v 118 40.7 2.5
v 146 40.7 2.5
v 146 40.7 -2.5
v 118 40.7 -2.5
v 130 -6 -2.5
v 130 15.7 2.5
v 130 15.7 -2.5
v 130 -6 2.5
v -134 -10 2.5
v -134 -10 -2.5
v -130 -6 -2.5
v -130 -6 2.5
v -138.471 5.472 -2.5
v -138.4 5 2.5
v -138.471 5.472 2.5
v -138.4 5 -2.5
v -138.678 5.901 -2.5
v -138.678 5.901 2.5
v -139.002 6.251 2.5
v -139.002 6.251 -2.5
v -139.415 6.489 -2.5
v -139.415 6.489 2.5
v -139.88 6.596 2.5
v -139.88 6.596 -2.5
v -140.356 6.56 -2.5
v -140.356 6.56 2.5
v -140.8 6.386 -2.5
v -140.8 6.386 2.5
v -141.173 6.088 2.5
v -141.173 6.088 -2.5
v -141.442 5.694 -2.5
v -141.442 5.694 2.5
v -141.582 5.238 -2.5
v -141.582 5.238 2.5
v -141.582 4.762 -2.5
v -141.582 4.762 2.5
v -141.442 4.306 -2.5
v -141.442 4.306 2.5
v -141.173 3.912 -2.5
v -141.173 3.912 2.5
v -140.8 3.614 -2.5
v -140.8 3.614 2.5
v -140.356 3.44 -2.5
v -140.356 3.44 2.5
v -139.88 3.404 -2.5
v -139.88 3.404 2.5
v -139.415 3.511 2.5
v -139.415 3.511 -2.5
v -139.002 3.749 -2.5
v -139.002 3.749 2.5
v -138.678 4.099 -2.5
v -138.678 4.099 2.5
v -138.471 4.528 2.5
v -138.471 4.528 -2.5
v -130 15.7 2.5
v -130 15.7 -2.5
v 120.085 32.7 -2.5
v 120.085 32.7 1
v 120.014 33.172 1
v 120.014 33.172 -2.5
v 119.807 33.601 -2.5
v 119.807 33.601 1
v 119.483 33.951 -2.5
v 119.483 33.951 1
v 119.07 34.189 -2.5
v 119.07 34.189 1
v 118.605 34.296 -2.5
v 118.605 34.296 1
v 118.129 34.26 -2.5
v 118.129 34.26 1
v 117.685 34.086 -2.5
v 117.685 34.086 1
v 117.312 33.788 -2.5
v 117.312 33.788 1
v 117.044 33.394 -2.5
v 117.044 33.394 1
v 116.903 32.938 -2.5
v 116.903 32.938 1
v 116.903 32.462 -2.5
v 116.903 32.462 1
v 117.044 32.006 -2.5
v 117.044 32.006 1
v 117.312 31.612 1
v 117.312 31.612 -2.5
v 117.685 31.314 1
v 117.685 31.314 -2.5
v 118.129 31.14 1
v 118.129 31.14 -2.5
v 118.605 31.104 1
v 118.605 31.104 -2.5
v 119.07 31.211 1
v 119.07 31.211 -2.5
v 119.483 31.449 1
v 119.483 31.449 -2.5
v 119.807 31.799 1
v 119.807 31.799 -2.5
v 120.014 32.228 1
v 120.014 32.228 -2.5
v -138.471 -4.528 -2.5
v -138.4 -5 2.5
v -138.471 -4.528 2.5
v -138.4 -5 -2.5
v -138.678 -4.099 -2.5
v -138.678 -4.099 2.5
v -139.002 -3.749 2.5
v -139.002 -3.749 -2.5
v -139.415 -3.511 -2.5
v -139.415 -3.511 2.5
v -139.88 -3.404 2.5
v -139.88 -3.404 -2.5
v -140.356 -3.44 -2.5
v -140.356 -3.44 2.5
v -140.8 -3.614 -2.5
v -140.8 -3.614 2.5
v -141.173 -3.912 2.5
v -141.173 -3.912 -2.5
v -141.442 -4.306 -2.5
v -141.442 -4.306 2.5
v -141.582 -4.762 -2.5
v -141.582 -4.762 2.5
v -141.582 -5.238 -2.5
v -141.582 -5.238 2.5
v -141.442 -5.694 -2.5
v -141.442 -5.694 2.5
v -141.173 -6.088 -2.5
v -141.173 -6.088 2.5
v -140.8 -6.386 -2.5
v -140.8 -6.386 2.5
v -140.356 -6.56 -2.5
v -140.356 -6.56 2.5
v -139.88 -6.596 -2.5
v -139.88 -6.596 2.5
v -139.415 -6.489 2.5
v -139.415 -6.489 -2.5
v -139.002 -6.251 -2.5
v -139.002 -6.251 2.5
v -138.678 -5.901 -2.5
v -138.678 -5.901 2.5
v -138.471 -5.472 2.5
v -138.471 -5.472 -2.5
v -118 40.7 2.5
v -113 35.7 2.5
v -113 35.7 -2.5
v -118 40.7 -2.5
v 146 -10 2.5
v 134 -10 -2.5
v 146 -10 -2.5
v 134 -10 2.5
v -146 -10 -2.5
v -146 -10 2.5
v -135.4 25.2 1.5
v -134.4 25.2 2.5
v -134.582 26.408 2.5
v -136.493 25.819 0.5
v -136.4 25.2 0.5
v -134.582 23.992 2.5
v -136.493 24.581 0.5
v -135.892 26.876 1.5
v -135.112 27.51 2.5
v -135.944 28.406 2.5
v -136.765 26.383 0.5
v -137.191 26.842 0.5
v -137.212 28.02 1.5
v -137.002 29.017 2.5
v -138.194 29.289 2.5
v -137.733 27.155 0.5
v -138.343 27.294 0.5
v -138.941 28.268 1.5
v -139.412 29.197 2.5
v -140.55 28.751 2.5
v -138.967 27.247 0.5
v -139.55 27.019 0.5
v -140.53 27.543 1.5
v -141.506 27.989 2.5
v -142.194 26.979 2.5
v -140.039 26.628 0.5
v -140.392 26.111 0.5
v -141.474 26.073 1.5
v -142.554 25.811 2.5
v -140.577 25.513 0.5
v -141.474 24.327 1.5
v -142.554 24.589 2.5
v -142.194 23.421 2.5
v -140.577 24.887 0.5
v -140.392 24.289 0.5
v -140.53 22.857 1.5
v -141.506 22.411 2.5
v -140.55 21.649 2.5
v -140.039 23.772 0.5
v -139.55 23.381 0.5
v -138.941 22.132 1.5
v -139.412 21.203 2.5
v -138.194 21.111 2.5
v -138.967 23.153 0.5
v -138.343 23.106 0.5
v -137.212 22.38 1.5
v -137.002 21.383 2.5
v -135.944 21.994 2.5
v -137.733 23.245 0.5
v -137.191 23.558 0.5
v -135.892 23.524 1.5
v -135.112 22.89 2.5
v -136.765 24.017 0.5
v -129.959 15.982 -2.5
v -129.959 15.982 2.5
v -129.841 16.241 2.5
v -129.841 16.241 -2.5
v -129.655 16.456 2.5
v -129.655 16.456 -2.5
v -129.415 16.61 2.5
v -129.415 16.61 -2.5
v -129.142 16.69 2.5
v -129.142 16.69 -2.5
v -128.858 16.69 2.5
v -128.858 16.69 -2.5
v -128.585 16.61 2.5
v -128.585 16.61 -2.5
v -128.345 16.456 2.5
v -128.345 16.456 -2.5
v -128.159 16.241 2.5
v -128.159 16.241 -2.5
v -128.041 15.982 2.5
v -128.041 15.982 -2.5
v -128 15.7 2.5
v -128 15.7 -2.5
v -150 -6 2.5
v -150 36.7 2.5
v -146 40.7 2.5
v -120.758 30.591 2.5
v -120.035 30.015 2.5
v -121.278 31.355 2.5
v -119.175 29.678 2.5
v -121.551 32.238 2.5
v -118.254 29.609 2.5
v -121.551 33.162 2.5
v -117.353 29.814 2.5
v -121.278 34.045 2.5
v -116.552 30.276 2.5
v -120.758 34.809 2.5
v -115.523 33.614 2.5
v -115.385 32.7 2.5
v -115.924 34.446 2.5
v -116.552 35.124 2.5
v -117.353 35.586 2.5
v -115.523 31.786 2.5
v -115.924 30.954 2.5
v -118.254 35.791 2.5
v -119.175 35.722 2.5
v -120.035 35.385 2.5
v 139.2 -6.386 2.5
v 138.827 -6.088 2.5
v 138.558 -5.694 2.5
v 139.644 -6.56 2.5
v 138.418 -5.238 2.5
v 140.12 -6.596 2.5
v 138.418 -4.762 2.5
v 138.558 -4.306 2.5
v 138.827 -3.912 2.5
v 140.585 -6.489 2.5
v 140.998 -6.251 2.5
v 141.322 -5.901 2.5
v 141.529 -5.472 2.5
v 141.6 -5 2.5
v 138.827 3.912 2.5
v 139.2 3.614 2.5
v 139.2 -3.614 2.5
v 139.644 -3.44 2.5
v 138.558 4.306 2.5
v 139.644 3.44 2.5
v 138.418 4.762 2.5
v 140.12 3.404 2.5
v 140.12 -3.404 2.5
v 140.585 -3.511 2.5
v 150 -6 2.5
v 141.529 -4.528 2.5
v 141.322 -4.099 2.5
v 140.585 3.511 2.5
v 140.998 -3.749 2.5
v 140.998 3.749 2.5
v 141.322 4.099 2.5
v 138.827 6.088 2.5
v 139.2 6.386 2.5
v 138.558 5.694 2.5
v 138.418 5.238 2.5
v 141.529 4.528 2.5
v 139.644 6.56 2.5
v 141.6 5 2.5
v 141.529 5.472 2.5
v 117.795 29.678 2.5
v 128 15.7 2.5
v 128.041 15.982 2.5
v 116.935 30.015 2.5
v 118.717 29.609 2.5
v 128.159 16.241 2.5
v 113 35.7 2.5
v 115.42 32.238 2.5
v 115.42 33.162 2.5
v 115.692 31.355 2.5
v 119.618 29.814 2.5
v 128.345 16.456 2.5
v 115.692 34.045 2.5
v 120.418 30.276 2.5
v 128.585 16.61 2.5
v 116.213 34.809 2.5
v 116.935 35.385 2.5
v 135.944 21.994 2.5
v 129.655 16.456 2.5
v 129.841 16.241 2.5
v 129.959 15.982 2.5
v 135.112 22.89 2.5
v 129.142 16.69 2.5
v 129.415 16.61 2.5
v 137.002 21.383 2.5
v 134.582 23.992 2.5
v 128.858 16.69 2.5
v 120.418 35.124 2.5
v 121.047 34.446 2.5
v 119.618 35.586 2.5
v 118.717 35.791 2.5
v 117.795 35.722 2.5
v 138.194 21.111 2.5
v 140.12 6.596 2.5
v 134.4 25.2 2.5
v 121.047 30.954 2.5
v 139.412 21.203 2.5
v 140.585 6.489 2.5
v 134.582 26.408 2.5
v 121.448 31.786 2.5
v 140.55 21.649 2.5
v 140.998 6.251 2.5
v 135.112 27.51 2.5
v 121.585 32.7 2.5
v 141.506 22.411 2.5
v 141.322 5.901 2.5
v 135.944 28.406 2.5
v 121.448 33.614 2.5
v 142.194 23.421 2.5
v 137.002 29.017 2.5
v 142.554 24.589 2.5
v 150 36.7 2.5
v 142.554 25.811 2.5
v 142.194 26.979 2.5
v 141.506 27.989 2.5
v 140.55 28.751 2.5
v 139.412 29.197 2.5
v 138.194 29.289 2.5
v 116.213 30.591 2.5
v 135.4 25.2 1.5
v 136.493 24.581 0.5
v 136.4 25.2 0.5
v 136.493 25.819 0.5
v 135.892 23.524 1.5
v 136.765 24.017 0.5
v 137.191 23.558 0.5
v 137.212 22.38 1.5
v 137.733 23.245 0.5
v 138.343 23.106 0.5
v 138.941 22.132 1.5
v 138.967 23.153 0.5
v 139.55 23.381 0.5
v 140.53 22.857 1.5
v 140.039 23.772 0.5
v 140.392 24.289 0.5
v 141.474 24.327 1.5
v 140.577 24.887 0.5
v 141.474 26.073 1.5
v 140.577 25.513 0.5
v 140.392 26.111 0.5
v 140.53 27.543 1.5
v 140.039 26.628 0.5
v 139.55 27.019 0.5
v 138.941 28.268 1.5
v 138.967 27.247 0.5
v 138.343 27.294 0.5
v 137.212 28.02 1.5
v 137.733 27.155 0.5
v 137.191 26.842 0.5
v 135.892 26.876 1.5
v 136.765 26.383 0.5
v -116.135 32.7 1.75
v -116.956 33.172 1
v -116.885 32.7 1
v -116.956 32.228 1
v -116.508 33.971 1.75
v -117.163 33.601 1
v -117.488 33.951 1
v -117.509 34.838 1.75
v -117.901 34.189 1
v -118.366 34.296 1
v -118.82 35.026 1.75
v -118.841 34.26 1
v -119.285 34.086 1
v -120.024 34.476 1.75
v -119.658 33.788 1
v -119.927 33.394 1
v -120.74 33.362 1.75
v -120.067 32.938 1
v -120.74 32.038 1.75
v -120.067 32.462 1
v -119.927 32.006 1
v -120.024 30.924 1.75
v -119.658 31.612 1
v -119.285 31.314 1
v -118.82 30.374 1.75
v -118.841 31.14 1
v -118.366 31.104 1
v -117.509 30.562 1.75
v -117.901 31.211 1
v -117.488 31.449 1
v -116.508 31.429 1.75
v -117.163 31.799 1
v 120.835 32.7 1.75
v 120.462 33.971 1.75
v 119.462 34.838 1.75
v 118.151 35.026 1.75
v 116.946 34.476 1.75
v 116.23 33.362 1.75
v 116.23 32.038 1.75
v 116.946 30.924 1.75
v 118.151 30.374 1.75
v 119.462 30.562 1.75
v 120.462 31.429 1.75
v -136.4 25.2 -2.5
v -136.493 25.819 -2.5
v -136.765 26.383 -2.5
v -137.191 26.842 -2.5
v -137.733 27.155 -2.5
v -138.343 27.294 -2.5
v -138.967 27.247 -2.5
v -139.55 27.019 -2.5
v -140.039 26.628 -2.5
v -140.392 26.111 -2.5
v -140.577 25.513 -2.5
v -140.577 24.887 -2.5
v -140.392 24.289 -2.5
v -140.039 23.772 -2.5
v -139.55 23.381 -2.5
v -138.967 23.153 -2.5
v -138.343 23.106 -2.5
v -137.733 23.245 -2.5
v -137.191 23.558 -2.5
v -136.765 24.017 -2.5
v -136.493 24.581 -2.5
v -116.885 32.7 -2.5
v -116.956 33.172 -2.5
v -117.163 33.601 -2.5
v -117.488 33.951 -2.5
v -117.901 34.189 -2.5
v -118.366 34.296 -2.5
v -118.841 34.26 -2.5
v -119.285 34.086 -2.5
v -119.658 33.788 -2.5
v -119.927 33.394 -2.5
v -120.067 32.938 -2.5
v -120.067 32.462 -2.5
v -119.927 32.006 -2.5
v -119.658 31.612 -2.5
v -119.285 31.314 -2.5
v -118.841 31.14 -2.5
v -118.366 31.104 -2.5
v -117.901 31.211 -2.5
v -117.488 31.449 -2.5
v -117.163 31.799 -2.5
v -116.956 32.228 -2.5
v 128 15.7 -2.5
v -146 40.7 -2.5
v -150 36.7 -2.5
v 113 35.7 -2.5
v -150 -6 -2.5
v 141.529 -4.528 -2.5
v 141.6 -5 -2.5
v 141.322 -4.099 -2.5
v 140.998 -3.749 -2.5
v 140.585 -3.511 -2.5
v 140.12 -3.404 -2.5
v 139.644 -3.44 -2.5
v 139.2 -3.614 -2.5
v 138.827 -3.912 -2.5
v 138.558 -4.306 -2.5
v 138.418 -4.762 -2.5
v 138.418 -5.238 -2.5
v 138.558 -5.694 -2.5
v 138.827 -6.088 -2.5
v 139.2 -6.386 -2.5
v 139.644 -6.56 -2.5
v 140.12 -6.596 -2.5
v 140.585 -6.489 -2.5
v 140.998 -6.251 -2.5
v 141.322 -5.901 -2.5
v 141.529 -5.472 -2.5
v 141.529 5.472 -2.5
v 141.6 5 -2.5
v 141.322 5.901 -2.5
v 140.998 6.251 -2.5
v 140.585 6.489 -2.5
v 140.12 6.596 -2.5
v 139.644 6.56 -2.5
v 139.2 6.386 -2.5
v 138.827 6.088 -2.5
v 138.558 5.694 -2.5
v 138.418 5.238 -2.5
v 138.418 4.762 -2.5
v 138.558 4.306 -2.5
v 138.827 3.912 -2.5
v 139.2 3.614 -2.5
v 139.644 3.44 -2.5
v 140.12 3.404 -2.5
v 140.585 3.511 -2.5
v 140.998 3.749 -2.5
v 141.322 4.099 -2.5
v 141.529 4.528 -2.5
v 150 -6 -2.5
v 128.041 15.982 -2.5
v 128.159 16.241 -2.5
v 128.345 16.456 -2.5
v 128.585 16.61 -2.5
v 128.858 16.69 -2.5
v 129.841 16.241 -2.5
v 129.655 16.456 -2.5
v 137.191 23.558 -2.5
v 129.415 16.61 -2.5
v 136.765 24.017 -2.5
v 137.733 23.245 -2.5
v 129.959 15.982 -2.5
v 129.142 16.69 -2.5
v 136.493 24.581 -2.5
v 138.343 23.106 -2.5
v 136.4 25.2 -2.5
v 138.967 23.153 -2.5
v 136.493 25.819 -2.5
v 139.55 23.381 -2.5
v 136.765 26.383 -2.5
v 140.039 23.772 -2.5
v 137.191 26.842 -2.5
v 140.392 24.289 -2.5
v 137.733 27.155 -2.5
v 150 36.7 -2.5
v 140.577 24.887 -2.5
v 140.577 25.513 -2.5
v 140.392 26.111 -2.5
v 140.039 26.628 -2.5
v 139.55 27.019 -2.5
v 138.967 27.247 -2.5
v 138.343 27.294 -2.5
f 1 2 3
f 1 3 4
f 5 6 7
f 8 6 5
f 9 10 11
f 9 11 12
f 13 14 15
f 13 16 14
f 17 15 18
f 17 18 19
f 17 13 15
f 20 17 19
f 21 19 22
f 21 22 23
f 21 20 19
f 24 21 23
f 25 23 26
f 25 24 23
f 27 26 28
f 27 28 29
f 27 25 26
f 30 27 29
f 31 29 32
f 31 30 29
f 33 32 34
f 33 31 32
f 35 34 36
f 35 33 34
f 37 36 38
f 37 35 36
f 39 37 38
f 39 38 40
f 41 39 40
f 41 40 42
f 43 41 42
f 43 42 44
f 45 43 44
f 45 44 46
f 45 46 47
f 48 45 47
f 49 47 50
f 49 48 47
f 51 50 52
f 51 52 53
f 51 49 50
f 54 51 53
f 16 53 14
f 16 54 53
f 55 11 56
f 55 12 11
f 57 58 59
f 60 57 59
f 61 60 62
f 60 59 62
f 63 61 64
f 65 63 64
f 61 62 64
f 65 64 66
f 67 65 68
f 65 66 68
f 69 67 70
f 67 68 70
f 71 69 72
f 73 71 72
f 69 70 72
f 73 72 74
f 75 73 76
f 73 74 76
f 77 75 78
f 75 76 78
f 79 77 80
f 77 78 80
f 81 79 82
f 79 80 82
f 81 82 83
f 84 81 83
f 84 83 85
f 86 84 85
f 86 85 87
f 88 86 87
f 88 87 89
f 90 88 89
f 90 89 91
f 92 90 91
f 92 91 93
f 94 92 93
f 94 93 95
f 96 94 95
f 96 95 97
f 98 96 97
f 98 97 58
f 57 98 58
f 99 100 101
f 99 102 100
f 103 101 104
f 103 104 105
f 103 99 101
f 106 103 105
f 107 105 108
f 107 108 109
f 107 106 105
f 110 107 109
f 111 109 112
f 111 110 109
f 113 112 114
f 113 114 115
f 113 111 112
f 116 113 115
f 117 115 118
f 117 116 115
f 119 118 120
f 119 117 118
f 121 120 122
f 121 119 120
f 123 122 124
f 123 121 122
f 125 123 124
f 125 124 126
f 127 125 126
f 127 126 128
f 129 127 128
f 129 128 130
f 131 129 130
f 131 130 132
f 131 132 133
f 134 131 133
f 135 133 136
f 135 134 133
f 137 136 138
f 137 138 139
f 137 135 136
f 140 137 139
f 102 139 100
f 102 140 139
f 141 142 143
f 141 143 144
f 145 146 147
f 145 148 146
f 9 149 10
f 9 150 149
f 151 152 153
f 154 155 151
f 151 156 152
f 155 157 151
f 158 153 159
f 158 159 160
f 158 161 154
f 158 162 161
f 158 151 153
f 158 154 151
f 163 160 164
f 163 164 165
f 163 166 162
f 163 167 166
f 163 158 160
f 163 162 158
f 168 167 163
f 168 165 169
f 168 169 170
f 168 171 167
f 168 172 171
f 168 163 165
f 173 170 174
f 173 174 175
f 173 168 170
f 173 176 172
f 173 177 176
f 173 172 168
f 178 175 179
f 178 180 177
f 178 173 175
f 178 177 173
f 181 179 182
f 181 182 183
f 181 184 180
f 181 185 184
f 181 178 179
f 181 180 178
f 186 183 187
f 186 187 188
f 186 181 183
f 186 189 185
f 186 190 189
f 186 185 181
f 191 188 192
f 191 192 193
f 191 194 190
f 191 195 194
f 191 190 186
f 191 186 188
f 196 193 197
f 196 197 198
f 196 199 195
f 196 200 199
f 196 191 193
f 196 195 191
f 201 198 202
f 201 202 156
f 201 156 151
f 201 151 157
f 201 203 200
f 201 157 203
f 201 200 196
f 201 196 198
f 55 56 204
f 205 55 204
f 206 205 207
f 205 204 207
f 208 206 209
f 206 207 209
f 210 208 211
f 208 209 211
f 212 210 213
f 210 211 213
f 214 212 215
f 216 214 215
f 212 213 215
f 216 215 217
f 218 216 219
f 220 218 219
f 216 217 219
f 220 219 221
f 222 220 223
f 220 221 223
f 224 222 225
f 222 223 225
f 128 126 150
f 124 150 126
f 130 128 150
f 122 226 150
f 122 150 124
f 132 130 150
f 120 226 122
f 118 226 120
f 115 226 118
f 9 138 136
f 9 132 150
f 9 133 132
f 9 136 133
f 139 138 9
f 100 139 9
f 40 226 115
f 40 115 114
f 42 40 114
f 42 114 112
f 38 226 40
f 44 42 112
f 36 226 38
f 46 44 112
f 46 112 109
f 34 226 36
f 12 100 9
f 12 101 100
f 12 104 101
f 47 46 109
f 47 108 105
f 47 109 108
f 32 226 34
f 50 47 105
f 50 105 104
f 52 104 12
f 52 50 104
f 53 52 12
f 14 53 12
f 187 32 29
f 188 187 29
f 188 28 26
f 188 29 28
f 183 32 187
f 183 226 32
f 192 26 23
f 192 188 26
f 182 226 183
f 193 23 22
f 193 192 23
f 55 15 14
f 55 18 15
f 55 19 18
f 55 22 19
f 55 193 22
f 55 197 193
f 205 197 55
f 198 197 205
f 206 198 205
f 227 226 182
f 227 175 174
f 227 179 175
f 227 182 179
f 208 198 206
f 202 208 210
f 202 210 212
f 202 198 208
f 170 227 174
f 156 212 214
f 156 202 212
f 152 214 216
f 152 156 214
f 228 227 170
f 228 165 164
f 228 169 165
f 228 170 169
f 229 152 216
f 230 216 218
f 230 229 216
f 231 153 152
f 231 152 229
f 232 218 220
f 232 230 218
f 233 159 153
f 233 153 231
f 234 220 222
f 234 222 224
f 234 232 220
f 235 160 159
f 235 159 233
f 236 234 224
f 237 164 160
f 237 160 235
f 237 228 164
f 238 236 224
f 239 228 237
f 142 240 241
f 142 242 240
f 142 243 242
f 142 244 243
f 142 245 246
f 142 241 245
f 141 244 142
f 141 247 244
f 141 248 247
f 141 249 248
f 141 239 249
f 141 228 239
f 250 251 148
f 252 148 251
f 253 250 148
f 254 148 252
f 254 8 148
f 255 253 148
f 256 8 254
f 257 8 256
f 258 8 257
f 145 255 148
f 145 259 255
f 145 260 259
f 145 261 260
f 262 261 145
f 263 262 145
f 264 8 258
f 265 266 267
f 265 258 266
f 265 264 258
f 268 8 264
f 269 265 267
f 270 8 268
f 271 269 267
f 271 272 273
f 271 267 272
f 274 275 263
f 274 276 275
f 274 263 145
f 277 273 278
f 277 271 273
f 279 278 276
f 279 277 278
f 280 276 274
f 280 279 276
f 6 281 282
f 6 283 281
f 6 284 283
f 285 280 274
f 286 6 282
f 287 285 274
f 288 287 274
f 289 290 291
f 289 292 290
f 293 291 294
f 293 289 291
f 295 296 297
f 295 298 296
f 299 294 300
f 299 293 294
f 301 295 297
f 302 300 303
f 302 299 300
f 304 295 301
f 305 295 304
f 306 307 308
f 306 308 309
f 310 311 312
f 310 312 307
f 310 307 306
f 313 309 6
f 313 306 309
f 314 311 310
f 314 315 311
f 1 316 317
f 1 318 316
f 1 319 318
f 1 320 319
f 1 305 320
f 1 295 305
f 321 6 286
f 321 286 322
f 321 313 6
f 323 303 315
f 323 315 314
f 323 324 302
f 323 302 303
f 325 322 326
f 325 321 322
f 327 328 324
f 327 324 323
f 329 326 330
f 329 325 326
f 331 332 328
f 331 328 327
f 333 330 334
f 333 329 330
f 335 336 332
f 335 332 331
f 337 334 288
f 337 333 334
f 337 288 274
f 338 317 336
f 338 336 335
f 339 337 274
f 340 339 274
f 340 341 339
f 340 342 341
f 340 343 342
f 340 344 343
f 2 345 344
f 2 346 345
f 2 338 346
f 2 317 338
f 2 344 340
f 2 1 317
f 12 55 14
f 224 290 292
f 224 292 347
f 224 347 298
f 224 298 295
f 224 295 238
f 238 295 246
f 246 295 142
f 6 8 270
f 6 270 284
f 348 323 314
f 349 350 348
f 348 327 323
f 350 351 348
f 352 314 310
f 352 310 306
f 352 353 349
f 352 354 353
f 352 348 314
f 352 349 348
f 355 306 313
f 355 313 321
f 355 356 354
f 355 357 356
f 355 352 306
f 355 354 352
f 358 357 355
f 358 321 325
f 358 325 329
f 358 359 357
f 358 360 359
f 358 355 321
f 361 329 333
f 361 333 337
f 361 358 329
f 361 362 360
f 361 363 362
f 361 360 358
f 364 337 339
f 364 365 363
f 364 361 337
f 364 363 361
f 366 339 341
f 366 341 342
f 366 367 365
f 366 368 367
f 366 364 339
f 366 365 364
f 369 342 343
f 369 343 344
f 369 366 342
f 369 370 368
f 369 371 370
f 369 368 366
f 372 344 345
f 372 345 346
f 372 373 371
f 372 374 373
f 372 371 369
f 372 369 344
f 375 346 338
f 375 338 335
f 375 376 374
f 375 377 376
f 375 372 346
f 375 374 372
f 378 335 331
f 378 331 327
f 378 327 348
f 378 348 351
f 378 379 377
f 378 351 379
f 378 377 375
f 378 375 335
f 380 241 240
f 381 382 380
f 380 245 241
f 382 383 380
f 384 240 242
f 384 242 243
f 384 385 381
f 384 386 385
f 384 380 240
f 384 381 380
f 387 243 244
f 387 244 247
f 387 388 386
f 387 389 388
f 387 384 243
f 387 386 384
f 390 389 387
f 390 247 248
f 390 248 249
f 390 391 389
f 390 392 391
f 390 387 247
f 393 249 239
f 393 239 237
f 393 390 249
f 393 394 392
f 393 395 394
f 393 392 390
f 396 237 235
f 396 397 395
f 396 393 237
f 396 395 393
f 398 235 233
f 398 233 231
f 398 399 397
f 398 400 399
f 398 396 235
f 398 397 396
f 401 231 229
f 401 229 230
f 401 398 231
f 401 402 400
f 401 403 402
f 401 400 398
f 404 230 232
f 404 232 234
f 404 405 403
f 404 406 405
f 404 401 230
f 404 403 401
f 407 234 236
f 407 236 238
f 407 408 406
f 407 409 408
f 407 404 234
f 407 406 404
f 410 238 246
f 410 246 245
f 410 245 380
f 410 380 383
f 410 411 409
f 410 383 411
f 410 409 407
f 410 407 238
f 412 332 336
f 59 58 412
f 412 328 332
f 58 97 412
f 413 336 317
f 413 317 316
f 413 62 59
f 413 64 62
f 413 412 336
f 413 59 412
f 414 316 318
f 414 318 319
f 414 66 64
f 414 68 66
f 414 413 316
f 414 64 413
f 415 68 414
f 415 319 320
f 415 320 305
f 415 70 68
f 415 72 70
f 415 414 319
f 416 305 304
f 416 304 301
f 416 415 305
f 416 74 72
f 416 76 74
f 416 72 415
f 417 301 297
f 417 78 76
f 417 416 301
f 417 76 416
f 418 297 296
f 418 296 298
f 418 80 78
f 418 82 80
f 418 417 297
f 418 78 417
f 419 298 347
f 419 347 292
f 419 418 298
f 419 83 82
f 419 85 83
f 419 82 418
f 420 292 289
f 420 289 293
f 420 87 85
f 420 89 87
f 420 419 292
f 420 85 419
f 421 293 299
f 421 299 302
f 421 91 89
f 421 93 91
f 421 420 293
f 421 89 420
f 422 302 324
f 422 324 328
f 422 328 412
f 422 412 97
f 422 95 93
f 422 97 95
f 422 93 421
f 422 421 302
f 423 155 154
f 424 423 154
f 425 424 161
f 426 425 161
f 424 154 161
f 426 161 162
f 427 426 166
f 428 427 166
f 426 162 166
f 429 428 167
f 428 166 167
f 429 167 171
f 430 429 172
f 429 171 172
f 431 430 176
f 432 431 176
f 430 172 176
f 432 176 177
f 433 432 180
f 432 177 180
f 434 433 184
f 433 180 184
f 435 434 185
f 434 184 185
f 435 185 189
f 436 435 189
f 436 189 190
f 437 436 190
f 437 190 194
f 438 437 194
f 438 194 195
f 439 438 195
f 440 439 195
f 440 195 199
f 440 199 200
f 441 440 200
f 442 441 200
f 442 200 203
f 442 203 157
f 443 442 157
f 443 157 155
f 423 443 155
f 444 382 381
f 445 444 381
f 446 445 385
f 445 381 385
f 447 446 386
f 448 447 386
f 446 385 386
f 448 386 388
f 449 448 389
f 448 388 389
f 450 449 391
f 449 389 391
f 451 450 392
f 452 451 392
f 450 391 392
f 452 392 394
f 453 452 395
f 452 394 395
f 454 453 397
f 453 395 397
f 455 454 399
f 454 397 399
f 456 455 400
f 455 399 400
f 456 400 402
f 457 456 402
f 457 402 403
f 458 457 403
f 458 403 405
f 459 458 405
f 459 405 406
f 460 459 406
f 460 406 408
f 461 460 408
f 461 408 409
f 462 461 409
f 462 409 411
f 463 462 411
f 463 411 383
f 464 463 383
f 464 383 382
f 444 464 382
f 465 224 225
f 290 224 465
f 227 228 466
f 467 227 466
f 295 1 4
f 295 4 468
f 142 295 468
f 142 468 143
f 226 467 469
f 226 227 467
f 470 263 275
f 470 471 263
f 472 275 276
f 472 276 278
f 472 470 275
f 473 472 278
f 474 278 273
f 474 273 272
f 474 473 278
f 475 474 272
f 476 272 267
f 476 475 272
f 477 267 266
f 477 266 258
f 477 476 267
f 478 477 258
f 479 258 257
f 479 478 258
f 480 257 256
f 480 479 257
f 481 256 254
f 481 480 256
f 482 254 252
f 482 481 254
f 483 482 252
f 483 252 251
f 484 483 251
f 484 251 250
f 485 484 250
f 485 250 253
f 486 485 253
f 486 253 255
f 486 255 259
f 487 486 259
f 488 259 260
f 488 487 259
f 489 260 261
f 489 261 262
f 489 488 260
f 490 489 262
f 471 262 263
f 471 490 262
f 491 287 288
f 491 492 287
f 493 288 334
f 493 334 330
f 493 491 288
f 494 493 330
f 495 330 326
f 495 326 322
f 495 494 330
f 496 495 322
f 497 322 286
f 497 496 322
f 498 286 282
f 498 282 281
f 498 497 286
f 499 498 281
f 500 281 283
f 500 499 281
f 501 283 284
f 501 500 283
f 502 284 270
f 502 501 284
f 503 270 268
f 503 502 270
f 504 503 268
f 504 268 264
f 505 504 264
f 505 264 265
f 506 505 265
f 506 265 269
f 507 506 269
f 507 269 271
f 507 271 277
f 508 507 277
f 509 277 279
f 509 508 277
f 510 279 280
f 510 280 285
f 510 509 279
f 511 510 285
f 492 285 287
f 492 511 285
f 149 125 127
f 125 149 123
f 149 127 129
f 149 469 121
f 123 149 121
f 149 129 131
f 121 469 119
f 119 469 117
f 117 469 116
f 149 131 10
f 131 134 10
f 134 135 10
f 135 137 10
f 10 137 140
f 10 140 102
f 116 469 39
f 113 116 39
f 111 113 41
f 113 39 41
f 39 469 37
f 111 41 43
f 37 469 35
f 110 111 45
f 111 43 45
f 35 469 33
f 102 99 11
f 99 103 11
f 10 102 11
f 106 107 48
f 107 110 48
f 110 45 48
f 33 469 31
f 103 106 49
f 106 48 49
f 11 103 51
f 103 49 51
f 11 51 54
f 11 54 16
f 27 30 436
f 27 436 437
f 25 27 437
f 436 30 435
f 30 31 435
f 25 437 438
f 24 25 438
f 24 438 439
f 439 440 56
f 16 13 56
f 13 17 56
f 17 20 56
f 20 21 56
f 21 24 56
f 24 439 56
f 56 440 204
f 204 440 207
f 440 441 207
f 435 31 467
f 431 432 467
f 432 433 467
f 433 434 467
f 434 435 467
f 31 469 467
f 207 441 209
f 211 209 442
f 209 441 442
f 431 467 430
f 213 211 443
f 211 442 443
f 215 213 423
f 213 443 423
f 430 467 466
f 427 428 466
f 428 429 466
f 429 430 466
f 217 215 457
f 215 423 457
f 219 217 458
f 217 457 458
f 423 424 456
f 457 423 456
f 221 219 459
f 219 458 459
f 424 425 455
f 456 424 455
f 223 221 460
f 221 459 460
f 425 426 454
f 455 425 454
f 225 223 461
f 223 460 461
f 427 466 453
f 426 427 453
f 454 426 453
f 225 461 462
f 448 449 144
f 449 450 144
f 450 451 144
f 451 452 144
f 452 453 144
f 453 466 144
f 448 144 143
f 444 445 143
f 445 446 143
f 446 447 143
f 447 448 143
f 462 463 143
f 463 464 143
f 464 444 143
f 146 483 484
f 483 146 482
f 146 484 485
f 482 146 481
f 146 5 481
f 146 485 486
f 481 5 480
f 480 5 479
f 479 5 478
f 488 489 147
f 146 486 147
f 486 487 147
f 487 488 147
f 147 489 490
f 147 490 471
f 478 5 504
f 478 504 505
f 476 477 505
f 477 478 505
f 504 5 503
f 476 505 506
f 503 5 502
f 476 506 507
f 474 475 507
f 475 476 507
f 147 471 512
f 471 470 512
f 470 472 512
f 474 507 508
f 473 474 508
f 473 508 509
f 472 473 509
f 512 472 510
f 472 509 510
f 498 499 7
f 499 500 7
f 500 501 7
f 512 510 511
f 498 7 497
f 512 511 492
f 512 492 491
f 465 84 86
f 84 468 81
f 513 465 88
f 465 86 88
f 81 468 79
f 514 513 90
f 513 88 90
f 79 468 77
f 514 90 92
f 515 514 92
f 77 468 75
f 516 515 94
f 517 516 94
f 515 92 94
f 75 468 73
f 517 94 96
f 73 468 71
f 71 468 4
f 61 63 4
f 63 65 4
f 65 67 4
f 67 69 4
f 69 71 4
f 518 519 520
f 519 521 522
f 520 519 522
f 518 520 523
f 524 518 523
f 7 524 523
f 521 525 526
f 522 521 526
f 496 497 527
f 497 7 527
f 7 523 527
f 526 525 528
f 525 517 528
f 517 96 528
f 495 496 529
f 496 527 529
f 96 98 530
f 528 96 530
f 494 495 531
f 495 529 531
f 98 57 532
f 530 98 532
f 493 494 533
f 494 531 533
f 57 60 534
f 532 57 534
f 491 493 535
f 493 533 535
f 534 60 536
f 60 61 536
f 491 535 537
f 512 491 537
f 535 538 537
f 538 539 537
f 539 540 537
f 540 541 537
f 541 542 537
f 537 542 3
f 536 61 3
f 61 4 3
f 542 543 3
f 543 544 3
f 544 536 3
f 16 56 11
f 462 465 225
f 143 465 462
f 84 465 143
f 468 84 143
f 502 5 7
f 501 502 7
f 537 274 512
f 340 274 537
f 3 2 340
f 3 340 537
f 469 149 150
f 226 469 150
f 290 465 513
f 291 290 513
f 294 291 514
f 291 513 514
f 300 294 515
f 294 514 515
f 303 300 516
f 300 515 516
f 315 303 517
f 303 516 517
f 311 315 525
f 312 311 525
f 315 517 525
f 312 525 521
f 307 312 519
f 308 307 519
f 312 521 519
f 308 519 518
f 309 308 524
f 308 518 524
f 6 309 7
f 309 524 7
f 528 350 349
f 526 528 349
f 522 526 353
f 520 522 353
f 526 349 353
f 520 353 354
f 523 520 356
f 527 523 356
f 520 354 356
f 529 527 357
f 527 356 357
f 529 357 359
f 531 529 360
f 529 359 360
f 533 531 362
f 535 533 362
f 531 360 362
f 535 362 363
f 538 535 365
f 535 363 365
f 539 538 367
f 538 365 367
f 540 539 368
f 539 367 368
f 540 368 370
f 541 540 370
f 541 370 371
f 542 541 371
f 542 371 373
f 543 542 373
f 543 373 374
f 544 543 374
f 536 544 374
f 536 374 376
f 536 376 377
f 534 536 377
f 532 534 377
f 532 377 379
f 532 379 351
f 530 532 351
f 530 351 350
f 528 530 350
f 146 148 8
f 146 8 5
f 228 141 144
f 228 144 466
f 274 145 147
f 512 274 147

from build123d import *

# Parameters (mm, degrees)
SKETCH_1_R          = 1.6
EXTRUDE_1_DEPTH     = 2.5
CUT_EXTRUDE_2_DEPTH = 156.503987087
CHAMFER_2_SIZE      = 4
SKETCH_6_R          = 1
CUT_EXTRUDE_3_DEPTH = 156.503987087
SKETCH_7_R          = 2.1
SKETCH_7_R_2        = 1.6
CUT_EXTRUDE_4_DEPTH = 156.503987087
CHAMFER_3_SIZE      = 1.5
CHAMFER_4_SIZE      = 2


with BuildPart() as part:
    # 草图1 → 凸台-拉伸1 (new, symmetric)
    with BuildSketch(Plane.XY):
        Polygon((-150, 40.7), (-150, -10), (-130, -10), (-130, 15.7), (130, 15.7), (130, -10), (150, -10), (150, 40.7), align=None)
        with Locations((-140, 5)):
            Circle(SKETCH_1_R, mode=Mode.SUBTRACT)
        with Locations((-140, -5)):
            Circle(SKETCH_1_R, mode=Mode.SUBTRACT)
        with Locations((140, 5)):
            Circle(SKETCH_1_R, mode=Mode.SUBTRACT)
        with Locations((140, -5)):
            Circle(SKETCH_1_R, mode=Mode.SUBTRACT)
    extrude(amount=EXTRUDE_1_DEPTH, both=True)

    # 草图4 → 切除-拉伸2 (cut, through all)
    with BuildSketch(Plane.XY.offset(2.5)):
        Polygon((118, 40.7), (113, 35.7), (-113, 35.7), (-118, 40.7), align=None)
    extrude(amount=-CUT_EXTRUDE_2_DEPTH, mode=Mode.SUBTRACT)

    # 倒角2
    chamfer_2_edges = [part.edges().sort_by_distance(p)[0] for p in [
        (-150, -10, 0),
        (-150, 40.7, 0),
        (150, 40.7, 0),
        (150, -10, 0),
        (130, -10, 0),
        (-130, -10, 0),
    ]]
    chamfer(chamfer_2_edges, length=CHAMFER_2_SIZE)

    # 草图6 → 切除-拉伸3 (cut, through all)
    with BuildSketch(Plane(origin=(0, 0, -2.5), x_dir=(-1, 0, 0), z_dir=(0, 0, -1))):
        with Locations((129, 15.7)):
            Circle(SKETCH_6_R)
        with Locations((-129, 15.7)):
            Circle(SKETCH_6_R)
    extrude(amount=-CUT_EXTRUDE_3_DEPTH, mode=Mode.SUBTRACT)

    # 草图7 → 切除-拉伸4 (cut, through all)
    with BuildSketch(Plane.XY.offset(2.5)):
        with Locations((-138.5, 25.2)):
            Circle(SKETCH_7_R)
        with Locations((118.485281374, 32.7)):
            Circle(SKETCH_7_R_2)
        with Locations((-118.485281374, 32.7)):
            Circle(SKETCH_7_R_2)
        with Locations(Location((138.5, 25.2, 0), (0, 0, 180))):
            Circle(SKETCH_7_R)
    extrude(amount=-CUT_EXTRUDE_4_DEPTH, mode=Mode.SUBTRACT)

    # 倒角3
    chamfer_3_edges = [part.edges().sort_by_distance(p)[0] for p in [
        (116.885281374, 32.7, 2.5),
        (-120.085281374, 32.7, 2.5),
    ]]
    chamfer(chamfer_3_edges, length=CHAMFER_3_SIZE)

    # 倒角4
    chamfer_4_edges = [part.edges().sort_by_distance(p)[0] for p in [
        (-140.6, 25.2, 2.5),
        (140.6, 25.2, 2.5),
    ]]
    chamfer(chamfer_4_edges, length=CHAMFER_4_SIZE)


solid = part.part
